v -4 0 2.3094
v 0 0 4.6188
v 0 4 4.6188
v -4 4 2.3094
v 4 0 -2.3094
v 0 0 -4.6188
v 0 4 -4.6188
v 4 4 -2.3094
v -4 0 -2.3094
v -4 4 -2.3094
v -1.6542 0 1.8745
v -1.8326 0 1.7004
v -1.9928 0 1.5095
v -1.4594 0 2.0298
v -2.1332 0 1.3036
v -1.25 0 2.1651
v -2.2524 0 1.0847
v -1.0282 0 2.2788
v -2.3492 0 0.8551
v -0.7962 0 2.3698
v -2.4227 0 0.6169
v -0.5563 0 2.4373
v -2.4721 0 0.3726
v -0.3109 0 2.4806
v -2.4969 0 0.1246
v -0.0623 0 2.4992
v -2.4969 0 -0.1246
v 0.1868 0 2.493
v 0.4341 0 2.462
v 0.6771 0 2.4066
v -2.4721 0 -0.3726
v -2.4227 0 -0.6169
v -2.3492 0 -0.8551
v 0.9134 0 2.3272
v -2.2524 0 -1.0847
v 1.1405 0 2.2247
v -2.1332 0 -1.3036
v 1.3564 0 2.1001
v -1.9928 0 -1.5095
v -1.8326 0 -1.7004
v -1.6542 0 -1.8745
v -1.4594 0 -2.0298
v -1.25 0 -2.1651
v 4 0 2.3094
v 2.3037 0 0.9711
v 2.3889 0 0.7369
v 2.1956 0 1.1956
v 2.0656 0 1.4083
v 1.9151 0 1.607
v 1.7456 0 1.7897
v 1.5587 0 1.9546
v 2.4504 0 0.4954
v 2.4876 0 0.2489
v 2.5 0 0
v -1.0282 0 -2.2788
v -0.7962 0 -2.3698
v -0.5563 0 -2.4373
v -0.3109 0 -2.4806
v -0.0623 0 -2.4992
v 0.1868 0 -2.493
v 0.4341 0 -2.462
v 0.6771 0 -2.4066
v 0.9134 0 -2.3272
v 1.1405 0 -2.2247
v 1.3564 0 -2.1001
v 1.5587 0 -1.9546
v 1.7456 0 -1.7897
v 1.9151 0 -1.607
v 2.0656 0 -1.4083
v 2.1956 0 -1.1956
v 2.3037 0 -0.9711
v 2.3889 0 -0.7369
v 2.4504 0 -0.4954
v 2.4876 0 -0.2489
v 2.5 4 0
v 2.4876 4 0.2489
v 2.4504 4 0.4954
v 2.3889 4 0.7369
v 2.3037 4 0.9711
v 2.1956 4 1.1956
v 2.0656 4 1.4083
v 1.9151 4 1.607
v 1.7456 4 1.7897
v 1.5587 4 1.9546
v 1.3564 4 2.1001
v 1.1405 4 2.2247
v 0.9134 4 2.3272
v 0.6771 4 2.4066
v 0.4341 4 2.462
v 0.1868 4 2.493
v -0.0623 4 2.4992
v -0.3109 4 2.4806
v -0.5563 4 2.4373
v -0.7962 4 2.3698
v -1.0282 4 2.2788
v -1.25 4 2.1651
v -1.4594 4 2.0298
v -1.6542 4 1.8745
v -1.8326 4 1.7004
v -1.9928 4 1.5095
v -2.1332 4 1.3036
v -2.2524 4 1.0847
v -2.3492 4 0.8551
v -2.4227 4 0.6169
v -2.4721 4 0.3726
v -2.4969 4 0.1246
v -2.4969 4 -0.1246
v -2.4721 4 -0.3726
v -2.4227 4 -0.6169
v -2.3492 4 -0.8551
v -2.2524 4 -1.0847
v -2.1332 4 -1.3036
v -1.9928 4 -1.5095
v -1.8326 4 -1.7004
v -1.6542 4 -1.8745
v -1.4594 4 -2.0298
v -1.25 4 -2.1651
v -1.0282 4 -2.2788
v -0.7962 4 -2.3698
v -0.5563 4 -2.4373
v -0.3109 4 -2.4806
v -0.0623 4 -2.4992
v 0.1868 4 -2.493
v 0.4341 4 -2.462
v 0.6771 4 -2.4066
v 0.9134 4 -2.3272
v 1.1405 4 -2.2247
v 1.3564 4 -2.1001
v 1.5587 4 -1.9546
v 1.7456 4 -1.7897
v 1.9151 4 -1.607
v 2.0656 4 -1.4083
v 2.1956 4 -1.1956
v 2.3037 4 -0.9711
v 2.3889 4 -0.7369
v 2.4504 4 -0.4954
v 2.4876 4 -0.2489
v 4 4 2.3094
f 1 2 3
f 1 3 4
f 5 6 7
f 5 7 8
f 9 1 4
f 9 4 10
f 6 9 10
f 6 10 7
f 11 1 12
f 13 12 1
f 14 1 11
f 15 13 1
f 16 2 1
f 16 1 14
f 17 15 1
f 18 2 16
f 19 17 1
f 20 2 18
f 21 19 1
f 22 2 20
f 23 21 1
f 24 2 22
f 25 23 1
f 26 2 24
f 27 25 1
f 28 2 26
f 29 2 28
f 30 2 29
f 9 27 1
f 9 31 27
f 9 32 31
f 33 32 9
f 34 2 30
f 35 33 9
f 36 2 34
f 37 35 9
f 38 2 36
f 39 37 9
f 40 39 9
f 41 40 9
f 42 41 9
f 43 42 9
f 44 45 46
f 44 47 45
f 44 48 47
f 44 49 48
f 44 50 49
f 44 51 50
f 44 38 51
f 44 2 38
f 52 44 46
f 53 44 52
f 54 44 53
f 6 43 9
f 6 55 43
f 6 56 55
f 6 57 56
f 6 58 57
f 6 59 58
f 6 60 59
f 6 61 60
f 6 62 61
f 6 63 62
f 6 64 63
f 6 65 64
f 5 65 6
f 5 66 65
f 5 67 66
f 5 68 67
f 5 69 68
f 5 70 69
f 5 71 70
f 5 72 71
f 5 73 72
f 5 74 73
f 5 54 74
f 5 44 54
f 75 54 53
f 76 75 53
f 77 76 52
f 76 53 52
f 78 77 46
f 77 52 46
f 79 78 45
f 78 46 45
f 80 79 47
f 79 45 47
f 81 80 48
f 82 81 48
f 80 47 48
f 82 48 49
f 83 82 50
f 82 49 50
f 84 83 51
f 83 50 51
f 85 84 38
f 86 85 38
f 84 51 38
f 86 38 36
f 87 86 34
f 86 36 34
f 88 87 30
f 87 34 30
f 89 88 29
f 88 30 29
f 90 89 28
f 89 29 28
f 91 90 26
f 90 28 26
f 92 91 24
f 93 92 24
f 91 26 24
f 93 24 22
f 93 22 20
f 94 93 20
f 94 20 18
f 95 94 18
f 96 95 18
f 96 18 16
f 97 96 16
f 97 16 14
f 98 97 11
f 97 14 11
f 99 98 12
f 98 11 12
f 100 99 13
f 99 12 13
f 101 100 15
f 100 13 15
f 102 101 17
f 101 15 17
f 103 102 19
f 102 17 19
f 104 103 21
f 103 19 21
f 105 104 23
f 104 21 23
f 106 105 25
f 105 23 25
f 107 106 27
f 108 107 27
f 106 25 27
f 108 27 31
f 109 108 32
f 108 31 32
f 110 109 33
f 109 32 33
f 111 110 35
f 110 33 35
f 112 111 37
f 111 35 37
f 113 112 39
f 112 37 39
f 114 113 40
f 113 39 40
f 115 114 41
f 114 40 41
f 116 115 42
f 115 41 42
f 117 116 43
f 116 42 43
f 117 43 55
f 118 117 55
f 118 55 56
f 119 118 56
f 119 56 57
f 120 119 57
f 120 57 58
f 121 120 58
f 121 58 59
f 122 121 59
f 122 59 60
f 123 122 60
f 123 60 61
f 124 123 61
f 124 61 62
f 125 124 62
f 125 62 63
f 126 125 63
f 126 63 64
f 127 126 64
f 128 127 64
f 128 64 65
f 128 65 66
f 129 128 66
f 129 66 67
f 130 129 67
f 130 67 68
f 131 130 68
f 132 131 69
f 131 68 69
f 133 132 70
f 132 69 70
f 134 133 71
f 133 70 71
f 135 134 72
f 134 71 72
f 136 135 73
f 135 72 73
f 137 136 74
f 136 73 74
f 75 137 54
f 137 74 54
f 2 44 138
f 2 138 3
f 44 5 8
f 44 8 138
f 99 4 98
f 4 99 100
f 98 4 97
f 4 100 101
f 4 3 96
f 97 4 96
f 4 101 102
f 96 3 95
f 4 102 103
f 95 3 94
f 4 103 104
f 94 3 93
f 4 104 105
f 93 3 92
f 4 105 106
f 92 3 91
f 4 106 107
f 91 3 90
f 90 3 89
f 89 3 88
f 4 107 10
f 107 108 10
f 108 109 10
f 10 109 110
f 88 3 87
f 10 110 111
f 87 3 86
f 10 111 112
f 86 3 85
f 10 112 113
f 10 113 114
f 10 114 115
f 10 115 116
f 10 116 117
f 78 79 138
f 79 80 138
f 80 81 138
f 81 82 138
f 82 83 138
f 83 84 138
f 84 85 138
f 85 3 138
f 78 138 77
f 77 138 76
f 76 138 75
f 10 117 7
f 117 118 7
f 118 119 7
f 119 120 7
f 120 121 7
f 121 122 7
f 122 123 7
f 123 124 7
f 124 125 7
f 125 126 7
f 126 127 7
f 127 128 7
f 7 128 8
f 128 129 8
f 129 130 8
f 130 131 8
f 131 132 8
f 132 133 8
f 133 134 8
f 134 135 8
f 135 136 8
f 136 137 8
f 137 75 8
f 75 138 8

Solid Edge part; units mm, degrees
sketch "Sketch1" plane through (0, 0, 0) normal (0, -1, 0) x (1, 0, 0)
  line L0 (4, 2.3094) -> (0, 4.6188)
  line L1 (0, 4.6188) -> (-4, 2.3094)
  line L2 (-4, 2.3094) -> (-4, -2.3094)
  line L3 (-4, -2.3094) -> (0, -4.6188)
  line L4 (0, -4.6188) -> (4, -2.3094)
  line L5 (4, -2.3094) -> (4, 2.3094)
  circle A0 centre (0, 0) radius 2.5
  dimension "D1" = 8
  dimension "D2" = 5
extrude "Protrusion1" add sketch "Sketch1" against normal blind 4
cosmetic_thread "Thread1" size "M5"
